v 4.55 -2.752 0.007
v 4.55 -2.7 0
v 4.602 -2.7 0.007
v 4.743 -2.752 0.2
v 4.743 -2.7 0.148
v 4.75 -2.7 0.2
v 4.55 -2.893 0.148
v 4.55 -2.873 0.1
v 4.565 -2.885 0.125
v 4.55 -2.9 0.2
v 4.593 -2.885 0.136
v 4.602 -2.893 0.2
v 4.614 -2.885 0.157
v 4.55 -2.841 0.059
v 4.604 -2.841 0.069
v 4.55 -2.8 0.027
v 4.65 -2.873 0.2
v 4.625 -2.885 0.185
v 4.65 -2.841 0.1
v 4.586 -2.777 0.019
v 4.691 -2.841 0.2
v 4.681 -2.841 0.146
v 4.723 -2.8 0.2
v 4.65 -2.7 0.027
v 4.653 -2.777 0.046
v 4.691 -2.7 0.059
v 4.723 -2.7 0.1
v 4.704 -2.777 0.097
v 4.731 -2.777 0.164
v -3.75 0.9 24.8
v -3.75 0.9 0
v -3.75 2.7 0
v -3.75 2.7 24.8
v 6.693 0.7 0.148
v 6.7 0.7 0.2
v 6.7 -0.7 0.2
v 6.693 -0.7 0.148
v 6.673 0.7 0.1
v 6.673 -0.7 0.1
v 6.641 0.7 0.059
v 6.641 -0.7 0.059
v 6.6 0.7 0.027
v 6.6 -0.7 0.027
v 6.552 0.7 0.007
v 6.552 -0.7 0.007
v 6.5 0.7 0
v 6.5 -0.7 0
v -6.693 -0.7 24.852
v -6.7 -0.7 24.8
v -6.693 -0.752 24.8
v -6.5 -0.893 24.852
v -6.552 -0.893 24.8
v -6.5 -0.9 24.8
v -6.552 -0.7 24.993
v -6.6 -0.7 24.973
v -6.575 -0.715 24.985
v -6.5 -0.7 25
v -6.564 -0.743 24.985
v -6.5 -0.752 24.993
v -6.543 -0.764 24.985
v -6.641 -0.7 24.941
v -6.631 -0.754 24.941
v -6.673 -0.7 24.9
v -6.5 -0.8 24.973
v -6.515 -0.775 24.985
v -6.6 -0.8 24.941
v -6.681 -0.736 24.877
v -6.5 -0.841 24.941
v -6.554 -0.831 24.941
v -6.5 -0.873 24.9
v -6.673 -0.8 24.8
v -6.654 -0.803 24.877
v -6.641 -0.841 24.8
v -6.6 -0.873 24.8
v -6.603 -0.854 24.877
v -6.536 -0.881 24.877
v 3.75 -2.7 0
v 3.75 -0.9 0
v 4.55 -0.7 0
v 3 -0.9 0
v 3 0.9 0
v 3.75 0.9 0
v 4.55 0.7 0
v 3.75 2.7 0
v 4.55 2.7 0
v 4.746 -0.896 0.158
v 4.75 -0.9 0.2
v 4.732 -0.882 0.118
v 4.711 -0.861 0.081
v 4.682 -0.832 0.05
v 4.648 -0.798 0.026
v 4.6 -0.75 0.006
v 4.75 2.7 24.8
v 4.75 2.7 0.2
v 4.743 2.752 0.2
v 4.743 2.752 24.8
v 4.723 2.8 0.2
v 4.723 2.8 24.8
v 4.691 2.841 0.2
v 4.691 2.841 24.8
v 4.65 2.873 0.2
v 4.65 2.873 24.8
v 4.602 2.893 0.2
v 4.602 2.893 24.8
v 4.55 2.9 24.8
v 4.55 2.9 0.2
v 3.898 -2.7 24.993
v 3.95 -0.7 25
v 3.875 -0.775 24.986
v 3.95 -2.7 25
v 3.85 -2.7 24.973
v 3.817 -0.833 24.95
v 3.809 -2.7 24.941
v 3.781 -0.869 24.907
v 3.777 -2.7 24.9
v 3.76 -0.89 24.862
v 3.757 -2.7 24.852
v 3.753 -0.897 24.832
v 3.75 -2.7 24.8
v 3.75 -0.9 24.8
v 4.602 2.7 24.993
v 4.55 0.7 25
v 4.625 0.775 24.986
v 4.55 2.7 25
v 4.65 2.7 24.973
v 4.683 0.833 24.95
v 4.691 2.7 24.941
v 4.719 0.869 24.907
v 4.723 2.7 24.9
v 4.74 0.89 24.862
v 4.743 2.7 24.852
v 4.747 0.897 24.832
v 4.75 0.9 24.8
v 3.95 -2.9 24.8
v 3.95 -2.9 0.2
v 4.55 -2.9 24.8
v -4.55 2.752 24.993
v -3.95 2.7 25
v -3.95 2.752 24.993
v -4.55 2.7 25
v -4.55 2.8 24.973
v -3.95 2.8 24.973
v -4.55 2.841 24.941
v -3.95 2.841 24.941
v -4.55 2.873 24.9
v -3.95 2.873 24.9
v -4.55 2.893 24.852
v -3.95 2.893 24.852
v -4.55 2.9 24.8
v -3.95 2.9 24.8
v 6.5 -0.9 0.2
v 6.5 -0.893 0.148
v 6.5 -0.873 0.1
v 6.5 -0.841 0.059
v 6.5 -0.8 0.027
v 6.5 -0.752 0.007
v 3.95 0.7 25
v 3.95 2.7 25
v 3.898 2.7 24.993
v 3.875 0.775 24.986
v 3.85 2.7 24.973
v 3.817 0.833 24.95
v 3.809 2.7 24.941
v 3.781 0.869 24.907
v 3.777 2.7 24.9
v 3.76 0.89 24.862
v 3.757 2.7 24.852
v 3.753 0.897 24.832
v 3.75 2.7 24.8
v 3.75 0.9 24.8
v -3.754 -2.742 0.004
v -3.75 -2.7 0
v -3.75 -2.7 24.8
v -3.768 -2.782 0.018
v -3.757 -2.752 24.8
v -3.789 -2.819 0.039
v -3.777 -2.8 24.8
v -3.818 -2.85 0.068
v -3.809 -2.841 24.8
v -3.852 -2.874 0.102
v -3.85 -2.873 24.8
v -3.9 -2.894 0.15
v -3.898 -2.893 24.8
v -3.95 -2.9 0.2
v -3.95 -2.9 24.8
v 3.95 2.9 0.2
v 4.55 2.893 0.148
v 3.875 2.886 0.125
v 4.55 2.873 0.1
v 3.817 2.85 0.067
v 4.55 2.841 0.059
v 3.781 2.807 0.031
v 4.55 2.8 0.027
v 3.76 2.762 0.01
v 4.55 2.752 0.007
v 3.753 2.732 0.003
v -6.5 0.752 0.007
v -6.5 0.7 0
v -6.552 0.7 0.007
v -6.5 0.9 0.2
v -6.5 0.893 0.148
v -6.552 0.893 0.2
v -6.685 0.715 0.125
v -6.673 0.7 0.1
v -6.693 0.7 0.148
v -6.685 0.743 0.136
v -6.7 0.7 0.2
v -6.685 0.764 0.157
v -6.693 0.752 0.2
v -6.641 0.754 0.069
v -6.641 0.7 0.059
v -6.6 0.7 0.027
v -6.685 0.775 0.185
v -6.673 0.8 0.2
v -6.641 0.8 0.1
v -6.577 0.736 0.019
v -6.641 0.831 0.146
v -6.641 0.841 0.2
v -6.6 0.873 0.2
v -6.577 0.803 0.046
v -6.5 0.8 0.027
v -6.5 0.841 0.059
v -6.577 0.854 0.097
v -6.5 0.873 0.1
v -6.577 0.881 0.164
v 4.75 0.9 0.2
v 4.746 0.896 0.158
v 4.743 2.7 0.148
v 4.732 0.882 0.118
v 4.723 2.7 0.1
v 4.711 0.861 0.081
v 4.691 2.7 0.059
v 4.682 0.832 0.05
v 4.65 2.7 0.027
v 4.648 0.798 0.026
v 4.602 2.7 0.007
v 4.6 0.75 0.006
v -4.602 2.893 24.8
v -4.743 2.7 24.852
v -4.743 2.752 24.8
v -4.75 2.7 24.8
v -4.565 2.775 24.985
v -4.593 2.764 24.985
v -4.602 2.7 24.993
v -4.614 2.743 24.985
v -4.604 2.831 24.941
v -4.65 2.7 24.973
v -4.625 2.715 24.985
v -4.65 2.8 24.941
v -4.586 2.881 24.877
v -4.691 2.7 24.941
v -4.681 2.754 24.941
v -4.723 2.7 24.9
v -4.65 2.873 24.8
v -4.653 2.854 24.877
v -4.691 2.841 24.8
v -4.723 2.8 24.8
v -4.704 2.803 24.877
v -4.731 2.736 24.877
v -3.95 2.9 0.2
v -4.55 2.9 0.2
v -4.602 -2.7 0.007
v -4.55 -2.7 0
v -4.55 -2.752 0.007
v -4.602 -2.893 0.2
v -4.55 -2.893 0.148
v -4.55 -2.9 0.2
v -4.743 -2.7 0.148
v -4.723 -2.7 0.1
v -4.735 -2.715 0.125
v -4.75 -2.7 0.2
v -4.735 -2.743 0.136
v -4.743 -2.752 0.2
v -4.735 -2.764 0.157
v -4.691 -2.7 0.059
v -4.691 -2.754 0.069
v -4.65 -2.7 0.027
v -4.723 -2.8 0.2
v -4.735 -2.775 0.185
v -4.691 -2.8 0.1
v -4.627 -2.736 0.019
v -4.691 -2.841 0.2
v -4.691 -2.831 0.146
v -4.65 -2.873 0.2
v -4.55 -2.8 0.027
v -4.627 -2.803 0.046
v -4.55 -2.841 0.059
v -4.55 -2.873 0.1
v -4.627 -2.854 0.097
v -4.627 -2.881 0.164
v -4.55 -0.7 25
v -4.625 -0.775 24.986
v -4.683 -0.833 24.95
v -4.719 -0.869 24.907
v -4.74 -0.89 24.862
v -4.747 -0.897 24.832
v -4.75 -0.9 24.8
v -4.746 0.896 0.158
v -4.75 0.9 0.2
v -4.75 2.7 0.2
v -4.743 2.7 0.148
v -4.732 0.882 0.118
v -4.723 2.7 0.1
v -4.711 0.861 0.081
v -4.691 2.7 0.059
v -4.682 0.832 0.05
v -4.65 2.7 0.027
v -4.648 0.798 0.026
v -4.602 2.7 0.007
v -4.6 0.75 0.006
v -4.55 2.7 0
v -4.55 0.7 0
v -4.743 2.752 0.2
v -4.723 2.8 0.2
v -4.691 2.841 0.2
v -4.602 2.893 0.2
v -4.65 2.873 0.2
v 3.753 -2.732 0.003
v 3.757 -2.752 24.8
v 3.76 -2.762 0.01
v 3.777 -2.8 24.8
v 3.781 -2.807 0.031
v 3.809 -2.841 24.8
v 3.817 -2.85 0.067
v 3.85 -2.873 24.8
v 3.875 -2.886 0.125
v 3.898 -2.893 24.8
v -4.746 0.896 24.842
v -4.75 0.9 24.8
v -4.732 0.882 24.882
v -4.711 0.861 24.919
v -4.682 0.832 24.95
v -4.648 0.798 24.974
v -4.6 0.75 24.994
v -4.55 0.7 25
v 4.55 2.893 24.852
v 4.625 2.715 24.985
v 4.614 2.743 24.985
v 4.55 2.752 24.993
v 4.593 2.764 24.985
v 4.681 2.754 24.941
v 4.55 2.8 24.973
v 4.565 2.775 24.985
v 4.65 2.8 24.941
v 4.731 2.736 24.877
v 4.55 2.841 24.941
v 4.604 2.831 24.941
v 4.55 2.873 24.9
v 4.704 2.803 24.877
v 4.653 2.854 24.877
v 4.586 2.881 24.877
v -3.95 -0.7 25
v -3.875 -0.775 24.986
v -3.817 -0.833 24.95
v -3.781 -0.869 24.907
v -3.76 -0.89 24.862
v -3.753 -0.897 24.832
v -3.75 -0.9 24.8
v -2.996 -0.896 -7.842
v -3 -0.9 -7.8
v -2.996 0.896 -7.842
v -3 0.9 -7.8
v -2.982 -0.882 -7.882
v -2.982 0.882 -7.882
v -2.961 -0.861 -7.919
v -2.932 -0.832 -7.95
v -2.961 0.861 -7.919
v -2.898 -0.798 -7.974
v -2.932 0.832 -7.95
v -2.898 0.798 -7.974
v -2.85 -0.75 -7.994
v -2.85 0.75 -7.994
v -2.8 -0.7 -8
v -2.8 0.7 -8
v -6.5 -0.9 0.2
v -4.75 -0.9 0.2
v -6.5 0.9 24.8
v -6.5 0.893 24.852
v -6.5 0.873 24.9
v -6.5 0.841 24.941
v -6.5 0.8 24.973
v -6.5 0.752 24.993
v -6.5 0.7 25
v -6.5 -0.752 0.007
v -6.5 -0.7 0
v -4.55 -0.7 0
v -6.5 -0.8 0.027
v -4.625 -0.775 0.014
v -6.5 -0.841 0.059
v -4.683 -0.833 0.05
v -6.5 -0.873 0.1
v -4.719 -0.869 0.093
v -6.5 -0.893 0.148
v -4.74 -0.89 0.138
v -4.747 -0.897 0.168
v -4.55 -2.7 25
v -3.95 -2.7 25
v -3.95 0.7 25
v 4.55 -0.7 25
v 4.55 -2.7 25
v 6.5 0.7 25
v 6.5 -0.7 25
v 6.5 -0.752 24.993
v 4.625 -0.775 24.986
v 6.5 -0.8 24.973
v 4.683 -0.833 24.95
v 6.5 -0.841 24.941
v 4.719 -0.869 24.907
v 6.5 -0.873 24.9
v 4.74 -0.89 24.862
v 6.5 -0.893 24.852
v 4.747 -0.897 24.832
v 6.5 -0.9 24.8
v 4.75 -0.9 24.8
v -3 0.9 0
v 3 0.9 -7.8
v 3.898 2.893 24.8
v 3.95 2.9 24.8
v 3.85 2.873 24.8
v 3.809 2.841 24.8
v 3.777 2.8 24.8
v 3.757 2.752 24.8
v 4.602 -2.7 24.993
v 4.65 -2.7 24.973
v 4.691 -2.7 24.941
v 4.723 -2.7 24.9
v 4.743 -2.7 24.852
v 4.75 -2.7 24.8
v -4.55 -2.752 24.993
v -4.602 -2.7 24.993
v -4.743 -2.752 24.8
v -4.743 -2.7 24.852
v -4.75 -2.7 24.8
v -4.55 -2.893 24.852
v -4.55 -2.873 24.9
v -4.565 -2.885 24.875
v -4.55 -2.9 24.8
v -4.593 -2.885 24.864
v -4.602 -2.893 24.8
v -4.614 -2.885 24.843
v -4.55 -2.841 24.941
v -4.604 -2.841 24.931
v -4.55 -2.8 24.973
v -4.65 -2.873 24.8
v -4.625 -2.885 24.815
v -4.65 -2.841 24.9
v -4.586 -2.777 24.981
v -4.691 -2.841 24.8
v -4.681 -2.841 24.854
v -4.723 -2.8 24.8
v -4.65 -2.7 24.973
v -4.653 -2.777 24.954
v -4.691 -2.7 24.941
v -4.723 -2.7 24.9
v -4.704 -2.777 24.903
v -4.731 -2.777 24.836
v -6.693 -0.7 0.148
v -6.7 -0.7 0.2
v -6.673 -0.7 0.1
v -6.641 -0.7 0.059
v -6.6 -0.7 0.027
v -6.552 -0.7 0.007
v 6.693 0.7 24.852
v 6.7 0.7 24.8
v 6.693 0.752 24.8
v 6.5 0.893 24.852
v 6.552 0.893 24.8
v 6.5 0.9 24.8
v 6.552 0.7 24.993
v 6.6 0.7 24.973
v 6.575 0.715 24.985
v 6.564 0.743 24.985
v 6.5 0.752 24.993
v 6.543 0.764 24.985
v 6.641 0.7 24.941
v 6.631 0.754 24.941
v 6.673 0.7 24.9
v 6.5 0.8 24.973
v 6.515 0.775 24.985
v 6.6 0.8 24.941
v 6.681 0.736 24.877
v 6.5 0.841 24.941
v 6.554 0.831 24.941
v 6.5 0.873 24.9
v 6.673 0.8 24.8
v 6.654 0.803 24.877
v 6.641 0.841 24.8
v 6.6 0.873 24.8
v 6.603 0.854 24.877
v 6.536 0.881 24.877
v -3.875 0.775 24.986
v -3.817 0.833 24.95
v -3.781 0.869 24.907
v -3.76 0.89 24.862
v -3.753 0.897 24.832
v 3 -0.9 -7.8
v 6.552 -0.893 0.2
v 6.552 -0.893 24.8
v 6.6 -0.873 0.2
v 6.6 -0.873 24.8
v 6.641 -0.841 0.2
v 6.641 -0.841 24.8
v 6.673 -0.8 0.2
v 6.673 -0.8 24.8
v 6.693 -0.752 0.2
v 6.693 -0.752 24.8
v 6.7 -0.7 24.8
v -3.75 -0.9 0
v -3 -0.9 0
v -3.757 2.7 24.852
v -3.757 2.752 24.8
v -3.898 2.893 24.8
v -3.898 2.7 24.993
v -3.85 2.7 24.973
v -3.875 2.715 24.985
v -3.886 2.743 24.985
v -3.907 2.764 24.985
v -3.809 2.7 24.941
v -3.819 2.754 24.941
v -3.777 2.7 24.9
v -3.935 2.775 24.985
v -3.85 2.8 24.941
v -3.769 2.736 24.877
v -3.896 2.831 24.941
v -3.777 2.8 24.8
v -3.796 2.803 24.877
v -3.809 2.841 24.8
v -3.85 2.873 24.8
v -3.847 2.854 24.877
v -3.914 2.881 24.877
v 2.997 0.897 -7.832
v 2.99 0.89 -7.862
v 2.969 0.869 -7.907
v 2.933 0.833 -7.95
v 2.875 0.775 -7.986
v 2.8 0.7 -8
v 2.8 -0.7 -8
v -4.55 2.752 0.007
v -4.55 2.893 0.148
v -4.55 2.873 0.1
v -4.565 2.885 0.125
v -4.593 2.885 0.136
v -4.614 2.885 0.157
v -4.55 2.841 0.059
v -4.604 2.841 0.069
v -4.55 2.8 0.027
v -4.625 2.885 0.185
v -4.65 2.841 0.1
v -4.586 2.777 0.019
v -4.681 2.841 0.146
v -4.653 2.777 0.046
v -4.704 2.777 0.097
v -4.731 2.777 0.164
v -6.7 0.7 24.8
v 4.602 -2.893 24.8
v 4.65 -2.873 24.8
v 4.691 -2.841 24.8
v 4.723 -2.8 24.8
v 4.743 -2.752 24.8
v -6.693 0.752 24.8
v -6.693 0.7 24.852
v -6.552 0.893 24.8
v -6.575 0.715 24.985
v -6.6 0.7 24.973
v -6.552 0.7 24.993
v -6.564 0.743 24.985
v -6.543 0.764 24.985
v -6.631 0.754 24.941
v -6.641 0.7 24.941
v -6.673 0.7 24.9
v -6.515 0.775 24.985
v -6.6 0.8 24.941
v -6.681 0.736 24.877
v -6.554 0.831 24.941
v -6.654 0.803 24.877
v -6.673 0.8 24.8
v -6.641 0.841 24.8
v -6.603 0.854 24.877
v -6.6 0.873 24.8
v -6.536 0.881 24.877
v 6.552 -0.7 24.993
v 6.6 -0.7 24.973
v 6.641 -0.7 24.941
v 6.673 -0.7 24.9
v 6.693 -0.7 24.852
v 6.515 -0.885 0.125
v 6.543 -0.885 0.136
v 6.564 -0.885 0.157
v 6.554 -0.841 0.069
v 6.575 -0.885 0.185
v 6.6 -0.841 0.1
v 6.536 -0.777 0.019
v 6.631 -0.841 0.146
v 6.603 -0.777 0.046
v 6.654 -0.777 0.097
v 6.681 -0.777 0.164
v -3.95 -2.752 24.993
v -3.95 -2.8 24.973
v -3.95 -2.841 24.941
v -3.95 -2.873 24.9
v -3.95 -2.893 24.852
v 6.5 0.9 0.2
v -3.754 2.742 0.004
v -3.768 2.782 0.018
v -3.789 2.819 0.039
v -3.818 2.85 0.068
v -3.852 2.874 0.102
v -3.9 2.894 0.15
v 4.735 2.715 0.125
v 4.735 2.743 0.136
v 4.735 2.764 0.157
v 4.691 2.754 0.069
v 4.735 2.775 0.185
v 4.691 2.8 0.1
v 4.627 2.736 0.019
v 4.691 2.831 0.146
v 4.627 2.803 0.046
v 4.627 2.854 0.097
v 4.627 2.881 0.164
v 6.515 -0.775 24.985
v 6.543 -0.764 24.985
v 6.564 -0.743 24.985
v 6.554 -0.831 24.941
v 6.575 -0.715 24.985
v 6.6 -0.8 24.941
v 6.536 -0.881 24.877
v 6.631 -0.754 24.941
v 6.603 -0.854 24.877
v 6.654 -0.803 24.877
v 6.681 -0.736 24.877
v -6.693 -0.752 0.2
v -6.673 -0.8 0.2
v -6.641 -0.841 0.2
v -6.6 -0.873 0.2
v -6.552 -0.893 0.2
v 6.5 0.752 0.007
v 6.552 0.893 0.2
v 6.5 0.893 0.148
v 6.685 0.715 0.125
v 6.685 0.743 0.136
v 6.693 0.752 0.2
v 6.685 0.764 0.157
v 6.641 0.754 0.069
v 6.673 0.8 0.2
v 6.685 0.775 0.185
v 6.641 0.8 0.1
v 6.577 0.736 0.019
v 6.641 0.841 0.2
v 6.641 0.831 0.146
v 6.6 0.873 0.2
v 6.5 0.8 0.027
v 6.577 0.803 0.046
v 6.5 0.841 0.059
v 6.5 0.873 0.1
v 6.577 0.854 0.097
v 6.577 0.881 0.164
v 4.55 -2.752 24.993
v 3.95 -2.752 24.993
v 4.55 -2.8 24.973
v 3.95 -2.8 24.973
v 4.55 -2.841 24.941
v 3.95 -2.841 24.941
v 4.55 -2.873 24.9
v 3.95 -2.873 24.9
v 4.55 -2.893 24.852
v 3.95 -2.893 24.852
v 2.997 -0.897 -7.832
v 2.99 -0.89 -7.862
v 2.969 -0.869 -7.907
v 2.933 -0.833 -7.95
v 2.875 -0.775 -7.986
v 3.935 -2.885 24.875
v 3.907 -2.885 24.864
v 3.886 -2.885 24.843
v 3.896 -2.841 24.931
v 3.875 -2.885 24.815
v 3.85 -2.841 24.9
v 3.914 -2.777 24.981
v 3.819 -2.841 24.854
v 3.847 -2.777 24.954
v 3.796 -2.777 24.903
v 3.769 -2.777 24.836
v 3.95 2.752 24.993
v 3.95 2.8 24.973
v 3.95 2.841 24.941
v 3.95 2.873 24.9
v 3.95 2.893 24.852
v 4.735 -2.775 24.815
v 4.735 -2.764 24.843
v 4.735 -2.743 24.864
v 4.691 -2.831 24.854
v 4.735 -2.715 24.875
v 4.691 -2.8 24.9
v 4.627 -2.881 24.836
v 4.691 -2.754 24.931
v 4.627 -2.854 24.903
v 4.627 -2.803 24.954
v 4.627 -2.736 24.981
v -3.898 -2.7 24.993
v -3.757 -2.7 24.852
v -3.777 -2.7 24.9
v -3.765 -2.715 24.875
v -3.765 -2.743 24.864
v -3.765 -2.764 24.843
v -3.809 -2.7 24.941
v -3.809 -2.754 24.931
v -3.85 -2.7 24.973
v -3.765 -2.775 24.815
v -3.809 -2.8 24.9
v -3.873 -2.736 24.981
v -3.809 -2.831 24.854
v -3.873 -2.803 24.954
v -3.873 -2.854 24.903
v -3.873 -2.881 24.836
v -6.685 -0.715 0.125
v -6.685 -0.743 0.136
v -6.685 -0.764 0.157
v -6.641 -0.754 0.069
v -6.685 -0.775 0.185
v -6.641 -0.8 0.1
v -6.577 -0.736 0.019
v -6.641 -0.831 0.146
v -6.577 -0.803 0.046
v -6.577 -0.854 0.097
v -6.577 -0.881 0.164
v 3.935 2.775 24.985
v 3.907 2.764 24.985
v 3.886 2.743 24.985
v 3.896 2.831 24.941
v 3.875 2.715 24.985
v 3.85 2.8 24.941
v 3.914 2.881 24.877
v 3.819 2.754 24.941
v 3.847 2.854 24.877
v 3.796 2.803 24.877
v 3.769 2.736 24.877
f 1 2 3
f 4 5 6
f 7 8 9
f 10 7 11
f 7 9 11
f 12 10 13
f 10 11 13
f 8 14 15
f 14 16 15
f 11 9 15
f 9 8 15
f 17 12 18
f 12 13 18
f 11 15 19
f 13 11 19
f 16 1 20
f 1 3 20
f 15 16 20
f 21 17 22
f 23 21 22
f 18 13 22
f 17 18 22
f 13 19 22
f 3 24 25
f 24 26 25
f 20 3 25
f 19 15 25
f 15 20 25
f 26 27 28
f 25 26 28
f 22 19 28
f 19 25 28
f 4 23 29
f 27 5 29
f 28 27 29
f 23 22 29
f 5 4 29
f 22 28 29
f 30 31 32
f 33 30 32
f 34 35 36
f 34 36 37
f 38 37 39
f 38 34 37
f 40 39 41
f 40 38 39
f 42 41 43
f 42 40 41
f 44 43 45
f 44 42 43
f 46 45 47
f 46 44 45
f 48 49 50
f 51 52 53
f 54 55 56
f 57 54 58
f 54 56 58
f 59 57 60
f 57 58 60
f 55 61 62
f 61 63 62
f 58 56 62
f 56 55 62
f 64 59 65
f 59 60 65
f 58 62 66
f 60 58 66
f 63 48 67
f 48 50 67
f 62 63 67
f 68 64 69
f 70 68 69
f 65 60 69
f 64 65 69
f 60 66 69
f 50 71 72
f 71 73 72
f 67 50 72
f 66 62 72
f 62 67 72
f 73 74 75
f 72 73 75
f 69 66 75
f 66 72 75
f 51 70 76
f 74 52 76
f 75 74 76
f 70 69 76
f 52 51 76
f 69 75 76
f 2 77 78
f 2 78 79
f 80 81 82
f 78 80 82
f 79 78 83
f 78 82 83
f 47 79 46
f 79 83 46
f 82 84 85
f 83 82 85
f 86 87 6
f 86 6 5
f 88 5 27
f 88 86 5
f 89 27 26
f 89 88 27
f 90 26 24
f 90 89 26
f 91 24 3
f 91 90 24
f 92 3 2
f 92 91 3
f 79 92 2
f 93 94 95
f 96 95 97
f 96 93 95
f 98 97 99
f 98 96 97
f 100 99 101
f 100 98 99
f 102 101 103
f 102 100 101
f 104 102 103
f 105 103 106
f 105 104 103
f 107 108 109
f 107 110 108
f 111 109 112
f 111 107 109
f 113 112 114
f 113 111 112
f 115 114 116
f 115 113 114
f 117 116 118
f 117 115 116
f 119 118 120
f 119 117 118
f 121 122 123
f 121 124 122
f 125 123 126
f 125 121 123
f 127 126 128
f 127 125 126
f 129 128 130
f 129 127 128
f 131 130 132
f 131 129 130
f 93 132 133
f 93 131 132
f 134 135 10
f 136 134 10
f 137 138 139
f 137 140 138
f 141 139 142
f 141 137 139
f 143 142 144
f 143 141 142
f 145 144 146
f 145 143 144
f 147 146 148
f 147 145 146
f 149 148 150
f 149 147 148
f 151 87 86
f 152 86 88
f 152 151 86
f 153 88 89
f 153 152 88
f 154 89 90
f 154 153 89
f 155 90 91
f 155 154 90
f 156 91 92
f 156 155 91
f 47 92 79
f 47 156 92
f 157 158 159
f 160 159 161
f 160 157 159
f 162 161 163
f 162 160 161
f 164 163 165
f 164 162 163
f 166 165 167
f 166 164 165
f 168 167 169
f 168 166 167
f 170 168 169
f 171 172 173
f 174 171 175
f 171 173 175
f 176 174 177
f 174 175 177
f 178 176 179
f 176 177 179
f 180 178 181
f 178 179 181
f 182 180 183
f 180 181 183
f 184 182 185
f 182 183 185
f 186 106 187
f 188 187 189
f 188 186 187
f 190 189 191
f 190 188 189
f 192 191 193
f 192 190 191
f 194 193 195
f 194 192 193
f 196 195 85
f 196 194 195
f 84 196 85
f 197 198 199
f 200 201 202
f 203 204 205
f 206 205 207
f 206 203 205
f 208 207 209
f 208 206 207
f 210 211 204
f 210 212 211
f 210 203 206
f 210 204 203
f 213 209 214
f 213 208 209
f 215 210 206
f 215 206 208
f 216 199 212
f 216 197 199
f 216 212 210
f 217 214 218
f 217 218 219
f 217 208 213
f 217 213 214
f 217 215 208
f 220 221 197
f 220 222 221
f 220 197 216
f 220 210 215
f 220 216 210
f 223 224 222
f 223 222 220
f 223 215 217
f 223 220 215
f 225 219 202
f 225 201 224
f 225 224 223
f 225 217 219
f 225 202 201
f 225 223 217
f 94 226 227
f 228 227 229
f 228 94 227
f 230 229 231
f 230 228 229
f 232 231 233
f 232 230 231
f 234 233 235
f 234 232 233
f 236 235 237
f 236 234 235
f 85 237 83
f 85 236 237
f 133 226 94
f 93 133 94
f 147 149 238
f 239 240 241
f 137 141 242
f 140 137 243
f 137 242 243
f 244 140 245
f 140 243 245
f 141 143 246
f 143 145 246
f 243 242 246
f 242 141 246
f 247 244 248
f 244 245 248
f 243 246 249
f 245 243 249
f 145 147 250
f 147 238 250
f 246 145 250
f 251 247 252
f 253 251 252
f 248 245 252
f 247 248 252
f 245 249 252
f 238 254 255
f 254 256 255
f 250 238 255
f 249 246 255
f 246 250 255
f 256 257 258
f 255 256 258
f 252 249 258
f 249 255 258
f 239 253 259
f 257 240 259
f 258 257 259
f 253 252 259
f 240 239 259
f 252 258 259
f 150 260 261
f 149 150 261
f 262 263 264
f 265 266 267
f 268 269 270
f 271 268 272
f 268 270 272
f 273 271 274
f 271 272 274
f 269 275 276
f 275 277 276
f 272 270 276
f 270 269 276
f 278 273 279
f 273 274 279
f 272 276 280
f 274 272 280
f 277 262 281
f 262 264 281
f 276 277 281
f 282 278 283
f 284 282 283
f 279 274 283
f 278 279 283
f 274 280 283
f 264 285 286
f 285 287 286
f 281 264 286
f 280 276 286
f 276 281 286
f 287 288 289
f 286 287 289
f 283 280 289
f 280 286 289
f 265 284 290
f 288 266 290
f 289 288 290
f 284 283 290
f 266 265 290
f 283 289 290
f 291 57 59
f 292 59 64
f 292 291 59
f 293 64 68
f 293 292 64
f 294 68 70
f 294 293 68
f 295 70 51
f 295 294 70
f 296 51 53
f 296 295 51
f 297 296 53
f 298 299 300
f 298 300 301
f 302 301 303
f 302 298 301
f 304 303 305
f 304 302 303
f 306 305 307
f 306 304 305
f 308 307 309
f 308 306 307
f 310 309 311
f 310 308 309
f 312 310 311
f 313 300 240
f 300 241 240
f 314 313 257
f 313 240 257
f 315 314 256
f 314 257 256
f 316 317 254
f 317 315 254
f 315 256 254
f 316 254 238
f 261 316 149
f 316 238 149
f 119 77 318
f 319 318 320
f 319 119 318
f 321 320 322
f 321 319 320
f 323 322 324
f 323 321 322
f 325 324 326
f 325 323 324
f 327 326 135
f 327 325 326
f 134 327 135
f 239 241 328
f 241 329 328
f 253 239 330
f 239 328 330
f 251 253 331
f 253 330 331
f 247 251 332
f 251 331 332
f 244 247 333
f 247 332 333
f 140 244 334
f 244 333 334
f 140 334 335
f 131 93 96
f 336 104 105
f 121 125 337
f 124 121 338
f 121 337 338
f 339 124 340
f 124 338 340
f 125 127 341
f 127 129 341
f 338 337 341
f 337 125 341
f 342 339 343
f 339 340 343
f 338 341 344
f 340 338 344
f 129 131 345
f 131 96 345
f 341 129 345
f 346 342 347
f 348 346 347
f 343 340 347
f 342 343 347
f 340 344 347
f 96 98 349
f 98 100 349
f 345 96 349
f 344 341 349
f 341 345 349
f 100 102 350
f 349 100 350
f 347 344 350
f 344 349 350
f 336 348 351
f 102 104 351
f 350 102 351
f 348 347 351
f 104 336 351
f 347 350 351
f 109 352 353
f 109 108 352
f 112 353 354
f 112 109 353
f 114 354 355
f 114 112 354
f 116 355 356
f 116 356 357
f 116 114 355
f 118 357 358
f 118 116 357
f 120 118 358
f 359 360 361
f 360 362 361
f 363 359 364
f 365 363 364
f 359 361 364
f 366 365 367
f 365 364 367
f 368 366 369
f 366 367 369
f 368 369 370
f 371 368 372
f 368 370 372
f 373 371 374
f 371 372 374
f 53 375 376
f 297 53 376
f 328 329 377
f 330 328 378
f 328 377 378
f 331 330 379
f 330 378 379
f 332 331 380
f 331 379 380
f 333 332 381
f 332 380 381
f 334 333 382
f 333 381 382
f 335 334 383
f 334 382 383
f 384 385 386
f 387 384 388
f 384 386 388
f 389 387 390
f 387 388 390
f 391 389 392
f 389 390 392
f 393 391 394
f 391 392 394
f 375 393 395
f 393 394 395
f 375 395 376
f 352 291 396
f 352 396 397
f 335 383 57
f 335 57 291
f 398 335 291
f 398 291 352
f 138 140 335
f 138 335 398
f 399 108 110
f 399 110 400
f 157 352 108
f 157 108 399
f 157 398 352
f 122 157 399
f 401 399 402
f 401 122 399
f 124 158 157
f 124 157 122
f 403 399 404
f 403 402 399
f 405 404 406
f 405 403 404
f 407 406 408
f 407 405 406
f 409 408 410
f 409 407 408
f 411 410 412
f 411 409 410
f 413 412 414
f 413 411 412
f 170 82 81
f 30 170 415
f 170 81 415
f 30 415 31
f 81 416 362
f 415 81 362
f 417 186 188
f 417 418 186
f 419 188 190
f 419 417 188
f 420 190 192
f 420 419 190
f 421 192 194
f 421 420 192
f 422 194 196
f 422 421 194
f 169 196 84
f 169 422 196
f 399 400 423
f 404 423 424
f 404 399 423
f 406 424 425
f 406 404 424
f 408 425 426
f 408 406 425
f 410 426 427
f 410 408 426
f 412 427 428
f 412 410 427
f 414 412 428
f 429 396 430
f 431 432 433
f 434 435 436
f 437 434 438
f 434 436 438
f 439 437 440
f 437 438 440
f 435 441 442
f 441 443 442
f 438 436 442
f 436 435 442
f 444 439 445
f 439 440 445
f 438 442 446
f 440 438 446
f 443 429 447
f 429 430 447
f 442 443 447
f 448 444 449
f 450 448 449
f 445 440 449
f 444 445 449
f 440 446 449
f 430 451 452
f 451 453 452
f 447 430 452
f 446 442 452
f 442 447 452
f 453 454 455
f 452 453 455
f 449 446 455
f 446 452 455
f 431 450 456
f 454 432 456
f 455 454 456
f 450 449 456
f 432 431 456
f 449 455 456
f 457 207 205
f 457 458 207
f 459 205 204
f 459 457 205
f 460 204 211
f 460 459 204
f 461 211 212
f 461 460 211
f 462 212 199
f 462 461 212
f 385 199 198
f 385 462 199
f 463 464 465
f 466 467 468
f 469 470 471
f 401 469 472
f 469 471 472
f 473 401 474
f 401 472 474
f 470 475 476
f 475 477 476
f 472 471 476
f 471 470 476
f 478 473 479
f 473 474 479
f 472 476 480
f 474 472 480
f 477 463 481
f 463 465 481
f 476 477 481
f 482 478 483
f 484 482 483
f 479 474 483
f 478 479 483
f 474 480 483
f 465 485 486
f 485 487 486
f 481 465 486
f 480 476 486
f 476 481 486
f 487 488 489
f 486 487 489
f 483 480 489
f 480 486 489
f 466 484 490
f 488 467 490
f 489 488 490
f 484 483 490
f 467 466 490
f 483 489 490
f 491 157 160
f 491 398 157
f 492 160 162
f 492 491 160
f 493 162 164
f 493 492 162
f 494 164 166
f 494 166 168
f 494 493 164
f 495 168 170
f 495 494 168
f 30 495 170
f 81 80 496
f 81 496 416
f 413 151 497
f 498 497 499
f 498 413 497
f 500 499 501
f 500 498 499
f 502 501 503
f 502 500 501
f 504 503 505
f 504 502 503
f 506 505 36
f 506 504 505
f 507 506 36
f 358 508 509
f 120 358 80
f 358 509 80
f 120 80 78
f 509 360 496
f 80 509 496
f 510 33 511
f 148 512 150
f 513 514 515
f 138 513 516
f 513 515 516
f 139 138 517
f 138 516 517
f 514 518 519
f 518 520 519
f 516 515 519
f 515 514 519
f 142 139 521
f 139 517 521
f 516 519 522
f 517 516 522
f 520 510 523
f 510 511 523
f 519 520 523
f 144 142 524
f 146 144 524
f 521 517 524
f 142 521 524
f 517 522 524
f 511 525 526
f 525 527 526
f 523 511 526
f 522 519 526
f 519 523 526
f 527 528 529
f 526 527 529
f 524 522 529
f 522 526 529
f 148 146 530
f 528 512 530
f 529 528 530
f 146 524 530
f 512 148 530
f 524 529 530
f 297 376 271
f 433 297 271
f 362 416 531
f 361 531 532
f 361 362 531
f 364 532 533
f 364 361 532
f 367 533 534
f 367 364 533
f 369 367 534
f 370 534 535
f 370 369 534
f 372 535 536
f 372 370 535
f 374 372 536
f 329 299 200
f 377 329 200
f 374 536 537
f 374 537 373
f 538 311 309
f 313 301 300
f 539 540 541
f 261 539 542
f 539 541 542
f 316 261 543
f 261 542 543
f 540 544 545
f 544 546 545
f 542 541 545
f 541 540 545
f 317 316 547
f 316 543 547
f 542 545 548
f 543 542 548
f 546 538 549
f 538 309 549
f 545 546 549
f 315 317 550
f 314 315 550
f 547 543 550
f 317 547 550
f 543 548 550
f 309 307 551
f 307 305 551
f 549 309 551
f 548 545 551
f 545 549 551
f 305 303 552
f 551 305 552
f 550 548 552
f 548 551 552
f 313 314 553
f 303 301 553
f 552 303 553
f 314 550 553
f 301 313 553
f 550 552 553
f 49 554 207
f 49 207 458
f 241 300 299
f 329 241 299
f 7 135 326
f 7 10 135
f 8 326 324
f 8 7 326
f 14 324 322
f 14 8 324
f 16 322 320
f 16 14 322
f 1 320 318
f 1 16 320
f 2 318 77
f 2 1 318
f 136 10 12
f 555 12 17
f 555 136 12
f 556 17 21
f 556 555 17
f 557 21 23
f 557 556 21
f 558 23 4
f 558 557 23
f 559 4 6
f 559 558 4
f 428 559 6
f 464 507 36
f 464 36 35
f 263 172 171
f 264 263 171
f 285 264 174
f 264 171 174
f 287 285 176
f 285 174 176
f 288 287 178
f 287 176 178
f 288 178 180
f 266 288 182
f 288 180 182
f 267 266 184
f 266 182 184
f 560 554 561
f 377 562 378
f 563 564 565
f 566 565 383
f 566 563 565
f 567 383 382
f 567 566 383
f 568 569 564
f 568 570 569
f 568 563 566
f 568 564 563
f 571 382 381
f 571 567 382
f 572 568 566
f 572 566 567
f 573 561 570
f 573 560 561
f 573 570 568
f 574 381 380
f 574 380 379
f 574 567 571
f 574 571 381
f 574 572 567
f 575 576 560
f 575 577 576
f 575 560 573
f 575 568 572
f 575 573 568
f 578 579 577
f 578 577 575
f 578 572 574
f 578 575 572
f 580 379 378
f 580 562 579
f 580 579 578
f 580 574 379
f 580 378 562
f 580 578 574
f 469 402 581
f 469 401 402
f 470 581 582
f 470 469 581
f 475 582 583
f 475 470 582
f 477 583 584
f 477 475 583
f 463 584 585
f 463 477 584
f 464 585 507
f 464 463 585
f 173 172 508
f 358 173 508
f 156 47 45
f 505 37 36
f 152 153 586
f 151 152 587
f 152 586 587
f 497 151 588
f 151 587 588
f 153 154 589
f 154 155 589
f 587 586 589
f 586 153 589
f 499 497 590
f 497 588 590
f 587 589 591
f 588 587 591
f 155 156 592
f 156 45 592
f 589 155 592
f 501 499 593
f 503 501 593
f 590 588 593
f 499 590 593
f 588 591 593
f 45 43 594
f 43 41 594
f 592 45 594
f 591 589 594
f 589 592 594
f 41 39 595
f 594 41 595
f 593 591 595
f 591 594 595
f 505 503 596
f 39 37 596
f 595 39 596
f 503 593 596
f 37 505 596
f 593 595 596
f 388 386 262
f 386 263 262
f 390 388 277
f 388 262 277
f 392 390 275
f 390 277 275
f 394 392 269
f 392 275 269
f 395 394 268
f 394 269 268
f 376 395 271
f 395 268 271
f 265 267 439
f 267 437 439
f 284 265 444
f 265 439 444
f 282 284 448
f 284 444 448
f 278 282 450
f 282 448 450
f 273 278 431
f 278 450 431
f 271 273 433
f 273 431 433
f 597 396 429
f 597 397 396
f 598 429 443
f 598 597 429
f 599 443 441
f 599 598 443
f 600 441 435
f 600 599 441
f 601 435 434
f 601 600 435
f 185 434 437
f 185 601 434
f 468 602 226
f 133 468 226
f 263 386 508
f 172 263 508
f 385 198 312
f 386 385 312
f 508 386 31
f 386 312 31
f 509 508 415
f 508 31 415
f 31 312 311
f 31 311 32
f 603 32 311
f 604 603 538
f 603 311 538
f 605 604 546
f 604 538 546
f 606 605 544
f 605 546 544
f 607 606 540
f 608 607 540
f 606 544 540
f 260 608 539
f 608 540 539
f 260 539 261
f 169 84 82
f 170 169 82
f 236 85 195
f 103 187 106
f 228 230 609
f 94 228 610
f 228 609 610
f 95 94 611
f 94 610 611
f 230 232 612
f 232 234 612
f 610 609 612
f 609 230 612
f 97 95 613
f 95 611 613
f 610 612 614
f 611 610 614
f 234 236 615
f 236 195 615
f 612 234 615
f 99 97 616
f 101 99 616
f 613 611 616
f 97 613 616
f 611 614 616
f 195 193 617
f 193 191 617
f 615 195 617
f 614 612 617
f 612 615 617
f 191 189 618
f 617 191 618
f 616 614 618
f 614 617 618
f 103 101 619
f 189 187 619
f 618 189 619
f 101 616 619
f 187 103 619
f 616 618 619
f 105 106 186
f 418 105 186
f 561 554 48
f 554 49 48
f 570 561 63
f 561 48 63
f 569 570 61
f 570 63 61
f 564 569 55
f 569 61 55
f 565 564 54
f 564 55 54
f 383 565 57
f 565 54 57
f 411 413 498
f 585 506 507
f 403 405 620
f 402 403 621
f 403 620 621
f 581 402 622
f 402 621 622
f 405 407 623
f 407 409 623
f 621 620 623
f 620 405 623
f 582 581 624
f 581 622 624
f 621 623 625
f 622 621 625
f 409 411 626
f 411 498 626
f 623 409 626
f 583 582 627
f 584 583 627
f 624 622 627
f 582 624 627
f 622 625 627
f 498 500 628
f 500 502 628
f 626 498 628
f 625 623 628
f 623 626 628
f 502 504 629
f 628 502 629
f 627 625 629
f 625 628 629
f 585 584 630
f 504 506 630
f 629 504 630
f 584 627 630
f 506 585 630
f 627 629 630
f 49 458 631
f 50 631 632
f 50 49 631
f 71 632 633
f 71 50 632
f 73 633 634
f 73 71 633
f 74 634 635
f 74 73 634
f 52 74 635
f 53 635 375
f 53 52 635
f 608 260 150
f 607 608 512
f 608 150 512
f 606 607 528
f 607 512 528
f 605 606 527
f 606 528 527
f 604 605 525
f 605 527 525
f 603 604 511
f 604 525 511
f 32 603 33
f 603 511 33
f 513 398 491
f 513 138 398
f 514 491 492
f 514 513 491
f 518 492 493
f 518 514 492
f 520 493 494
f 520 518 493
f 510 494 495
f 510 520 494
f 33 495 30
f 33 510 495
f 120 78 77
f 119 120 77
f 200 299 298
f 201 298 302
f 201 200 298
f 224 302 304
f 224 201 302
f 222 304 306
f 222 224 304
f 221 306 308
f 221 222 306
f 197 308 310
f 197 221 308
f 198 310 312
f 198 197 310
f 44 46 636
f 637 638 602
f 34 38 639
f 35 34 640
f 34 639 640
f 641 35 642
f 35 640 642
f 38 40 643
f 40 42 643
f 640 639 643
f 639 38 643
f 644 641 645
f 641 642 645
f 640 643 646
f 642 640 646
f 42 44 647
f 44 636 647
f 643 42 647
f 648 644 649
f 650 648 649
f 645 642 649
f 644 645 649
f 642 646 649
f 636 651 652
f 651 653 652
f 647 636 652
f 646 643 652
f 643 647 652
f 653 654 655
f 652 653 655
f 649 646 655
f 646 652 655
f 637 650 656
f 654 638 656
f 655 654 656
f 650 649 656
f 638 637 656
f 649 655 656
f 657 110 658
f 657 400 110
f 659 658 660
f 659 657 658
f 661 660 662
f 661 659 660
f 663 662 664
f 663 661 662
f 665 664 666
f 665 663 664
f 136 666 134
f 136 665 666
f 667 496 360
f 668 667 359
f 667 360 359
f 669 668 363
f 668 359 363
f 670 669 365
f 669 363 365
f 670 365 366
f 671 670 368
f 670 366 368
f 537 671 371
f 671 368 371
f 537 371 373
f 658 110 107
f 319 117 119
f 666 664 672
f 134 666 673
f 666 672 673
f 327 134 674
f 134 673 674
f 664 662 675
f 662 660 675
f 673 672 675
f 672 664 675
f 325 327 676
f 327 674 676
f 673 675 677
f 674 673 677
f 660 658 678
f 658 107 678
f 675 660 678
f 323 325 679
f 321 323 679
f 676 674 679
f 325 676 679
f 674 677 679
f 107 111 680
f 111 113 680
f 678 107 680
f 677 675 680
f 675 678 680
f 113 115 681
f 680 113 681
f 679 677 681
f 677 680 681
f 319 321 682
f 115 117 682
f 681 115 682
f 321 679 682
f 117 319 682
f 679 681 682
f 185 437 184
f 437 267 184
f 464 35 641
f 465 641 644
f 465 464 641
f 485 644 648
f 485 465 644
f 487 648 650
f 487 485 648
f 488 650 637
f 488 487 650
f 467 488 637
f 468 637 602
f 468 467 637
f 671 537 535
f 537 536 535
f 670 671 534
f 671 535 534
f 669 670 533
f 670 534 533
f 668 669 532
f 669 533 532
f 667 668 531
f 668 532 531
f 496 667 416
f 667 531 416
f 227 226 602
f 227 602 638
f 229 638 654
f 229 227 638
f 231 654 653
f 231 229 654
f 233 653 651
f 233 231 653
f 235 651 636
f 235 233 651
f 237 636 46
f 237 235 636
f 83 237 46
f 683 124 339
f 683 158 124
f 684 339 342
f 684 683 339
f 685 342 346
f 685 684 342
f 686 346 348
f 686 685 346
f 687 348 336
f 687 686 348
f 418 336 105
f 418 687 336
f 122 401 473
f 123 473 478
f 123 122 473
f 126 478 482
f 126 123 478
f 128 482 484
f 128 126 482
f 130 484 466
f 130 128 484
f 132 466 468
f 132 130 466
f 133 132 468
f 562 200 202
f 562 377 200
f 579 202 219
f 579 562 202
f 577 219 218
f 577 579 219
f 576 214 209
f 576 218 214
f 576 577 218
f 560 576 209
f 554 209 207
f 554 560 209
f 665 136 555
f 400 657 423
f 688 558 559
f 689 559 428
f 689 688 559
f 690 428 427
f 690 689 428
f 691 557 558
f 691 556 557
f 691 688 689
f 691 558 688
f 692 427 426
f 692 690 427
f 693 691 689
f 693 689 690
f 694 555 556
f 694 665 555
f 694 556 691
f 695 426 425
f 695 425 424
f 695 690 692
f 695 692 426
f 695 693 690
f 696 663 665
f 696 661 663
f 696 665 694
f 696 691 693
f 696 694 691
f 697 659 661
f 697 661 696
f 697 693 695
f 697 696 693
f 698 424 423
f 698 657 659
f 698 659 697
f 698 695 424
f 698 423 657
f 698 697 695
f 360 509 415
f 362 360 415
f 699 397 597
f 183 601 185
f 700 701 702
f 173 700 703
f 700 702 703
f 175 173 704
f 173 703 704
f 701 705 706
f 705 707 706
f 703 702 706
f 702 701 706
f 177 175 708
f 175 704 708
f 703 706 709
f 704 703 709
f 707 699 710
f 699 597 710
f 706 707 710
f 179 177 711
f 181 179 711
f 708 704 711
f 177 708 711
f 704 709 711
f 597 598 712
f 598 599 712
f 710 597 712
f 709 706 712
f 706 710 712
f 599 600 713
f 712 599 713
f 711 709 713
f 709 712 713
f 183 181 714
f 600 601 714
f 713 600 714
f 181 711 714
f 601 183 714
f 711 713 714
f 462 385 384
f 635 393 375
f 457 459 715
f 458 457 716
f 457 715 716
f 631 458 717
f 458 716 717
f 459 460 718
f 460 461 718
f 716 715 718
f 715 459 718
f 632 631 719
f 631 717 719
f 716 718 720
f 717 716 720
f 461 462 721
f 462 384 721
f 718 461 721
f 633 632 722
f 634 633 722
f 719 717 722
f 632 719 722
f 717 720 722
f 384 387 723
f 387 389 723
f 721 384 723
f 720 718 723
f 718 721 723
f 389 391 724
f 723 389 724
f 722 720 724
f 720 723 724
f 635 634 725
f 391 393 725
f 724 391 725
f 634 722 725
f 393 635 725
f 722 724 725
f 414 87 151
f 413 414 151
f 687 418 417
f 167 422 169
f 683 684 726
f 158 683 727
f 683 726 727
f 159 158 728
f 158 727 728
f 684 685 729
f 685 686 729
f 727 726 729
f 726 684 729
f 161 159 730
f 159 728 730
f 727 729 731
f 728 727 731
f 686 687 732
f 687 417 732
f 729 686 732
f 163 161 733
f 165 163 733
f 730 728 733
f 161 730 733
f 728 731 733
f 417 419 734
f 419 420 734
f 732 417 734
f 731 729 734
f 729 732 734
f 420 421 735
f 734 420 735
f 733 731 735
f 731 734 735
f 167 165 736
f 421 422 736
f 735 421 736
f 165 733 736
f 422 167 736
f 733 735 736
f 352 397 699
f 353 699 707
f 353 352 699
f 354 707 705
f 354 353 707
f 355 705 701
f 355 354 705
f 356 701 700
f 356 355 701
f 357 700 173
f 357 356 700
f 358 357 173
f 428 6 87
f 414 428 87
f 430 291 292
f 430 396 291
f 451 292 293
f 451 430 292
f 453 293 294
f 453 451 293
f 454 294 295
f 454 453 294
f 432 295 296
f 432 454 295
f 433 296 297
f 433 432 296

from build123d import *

# Parameters (mm, degrees)
AUFSATZ_LINEAR_AUSTRAGEN1_DEPTH = 25
SKIZZE2_W                       = 6
SKIZZE2_H                       = 1.8
AUFSATZ_LINEAR_AUSTRAGEN2_DEPTH = 8
VERRUNDUNG1_R                   = 0.2


with BuildPart() as part:
    # Skizze1 → Aufsatz-Linear austragen1 (new body)
    with BuildSketch(Plane.XY):
        Polygon((-4.75, 0.9), (-6.7, 0.9), (-6.7, -0.9), (-4.75, -0.9), (-4.75, -2.9), (-3.75, -2.9), (-3.75, -0.9), (3.75, -0.9), (3.75, -2.9), (4.75, -2.9), (4.75, -0.9), (6.7, -0.9), (6.7, 0.9), (4.75, 0.9), (4.75, 2.9), (3.75, 2.9), (3.75, 0.9), (-3.75, 0.9), (-3.75, 2.9), (-4.75, 2.9), align=None)
    extrude(amount=AUFSATZ_LINEAR_AUSTRAGEN1_DEPTH)

    # Skizze2 → Aufsatz-Linear austragen2 (add)
    with BuildSketch(Plane(origin=(0, 0, 0), x_dir=(-1, 0, 0), z_dir=(0, 0, -1))):
        Rectangle(SKIZZE2_W, SKIZZE2_H)
    extrude(amount=AUFSATZ_LINEAR_AUSTRAGEN2_DEPTH)

    # Verrundung1
    verrundung1_edges = [part.edges().sort_by_distance(p)[0] for p in [
        (-4.75, -1.9, 25),
        (-4.25, -2.9, 25),
        (-5.725, 0.9, 0),
        (-4.75, 1.9, 0),
        (-4.25, 2.9, 0),
        (-3.75, -1.9, 25),
        (4.25, 2.9, 0),
        (4.75, 1.9, 0),
        (5.725, 0.9, 0),
        (6.7, 0, 0),
        (5.725, -0.9, 0),
        (4.75, -1.9, 0),
        (4.25, -2.9, 0),
        (0, -0.9, 25),
        (-4.25, -2.9, 0),
        (-4.75, -1.9, 0),
        (-5.725, -0.9, 0),
        (-6.7, 0, 0),
        (3.75, -1.9, 25),
        (4.25, -2.9, 25),
        (-6.7, 0.9, 12.5),
        (-4.75, 2.9, 12.5),
        (-3.75, 2.9, 12.5),
        (3.75, 2.9, 12.5),
        (4.75, 2.9, 12.5),
        (6.7, 0.9, 12.5),
        (6.7, -0.9, 12.5),
        (4.75, -2.9, 12.5),
        (3.75, -2.9, 12.5),
        (-3.75, -2.9, 12.5),
        (-4.75, -2.9, 12.5),
        (-6.7, -0.9, 12.5),
        (4.75, -1.9, 25),
        (5.725, -0.9, 25),
        (6.7, 0, 25),
        (5.725, 0.9, 25),
        (-6.7, 0, 25),
        (4.75, 1.9, 25),
        (4.25, 2.9, 25),
        (3, 0, -8),
        (3.75, 1.9, 25),
        (0, -0.9, -8),
        (-3, 0, -8),
        (0, 0.9, -8),
        (0, 0.9, 25),
        (-3.75, 1.9, 25),
        (-4.25, 2.9, 25),
        (-4.75, 1.9, 25),
        (-5.725, 0.9, 25),
        (-5.725, -0.9, 25),
    ]]
    fillet(verrundung1_edges, radius=VERRUNDUNG1_R)


solid = part.part
